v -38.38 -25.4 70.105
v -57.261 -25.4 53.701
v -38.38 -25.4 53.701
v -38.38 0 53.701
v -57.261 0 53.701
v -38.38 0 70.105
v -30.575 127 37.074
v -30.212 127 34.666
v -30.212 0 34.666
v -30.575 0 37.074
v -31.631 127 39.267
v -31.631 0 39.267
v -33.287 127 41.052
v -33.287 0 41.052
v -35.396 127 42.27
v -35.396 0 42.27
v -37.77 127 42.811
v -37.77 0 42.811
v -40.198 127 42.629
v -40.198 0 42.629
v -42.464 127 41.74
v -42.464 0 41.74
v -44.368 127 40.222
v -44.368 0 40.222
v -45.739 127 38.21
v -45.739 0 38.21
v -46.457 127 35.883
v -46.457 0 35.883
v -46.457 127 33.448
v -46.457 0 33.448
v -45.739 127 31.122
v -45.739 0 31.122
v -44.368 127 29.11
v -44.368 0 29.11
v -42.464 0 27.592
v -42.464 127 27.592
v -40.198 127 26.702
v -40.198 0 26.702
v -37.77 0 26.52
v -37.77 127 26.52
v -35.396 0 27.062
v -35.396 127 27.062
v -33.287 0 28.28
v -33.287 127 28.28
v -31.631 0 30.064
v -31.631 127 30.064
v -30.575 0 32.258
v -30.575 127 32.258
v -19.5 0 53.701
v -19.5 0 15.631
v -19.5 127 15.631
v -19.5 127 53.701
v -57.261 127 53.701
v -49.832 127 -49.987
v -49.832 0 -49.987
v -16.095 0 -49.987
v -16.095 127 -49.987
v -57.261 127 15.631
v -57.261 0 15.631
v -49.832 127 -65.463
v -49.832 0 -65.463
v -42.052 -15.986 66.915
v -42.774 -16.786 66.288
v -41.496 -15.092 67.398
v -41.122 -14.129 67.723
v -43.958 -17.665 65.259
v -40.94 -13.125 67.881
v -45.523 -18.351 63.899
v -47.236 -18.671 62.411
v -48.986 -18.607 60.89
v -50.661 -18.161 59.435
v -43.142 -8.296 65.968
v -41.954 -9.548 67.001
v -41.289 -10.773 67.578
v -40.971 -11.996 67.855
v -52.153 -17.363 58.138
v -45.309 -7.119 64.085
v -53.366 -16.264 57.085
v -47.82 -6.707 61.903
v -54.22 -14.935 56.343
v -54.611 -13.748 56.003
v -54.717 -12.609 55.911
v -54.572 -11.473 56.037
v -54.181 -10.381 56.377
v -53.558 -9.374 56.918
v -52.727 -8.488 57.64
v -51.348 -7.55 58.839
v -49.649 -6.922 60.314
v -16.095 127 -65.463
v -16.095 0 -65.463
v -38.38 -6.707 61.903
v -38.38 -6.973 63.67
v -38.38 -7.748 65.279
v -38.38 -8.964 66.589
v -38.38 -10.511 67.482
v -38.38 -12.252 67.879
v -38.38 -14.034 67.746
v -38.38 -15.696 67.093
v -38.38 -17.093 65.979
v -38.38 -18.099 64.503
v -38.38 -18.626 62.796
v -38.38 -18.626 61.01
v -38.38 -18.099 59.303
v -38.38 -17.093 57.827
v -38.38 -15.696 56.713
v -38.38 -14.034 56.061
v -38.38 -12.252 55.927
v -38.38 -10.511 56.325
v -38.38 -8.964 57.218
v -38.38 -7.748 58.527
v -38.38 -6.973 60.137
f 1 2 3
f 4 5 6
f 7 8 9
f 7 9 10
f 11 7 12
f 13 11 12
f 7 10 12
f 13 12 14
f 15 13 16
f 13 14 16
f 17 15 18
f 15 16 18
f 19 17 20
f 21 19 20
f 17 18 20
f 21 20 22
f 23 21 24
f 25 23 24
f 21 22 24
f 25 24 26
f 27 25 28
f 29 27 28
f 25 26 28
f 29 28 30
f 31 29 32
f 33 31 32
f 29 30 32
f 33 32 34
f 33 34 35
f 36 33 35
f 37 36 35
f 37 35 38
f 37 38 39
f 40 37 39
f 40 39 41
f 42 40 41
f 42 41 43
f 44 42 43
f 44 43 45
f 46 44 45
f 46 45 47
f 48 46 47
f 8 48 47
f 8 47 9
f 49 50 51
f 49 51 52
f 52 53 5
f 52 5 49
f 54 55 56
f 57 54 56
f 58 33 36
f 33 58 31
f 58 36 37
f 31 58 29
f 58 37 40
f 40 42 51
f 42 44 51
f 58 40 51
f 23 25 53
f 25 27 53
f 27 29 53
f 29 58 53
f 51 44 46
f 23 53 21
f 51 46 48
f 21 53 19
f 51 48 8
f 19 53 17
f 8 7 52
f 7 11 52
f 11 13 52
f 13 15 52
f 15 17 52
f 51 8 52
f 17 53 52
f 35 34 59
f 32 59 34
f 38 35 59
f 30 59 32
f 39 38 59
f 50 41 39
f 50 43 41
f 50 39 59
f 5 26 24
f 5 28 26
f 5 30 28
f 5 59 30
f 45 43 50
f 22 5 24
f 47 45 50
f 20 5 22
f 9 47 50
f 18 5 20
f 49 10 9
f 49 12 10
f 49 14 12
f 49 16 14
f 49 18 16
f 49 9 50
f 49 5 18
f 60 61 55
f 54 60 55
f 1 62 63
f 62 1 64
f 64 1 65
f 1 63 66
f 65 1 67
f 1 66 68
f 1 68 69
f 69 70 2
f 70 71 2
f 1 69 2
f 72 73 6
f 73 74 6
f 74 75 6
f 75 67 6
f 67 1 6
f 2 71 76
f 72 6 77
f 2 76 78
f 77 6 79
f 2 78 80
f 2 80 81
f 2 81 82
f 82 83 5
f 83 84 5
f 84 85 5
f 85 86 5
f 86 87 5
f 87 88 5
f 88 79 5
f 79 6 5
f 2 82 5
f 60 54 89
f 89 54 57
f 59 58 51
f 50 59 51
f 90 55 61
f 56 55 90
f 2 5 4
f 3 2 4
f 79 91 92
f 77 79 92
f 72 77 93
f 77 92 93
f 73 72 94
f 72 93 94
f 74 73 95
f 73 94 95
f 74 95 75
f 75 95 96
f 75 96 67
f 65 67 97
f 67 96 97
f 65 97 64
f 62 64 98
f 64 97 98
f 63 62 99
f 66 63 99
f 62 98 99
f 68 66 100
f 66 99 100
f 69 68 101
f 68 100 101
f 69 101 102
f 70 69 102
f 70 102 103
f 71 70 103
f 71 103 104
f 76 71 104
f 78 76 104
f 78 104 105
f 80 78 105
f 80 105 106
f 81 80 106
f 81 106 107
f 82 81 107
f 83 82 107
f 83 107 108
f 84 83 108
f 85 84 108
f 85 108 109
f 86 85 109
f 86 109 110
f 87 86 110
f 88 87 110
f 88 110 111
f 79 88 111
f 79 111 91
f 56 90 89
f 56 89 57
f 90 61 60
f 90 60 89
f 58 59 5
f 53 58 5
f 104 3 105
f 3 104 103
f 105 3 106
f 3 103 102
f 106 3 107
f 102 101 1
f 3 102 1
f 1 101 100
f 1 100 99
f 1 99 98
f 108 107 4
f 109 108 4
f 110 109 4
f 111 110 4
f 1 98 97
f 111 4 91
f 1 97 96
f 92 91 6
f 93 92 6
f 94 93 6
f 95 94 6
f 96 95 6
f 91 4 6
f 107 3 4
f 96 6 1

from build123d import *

# Parameters (mm, degrees)
F0_W     = 33.7372906506
F0_H     = 15.4758244753
F1_DEPTH = 127
F0_W_2   = 37.7610065043
F0_H_2   = 38.0705222487
F2_R     = 8.1683633369
F3_DEPTH = 127.001
F5_DEPTH = 25.4
F6_R     = 5.9928653271
F8_DEPTH = 25.4


with BuildPart() as f1:
    # F0 (on Front) → F1 (new body)
    with BuildSketch(Plane.XZ):
        with Locations((-32.9635012895, -57.7248185873)):
            Rectangle(F0_W, F0_H)
    extrude(amount=-F1_DEPTH)


with BuildPart() as f1b:
    # F0 (on Front) → F1, piece 2 (new body)
    with BuildSketch(Plane.XZ):
        with Locations((-38.3800398558, 34.6658416092)):
            Rectangle(F0_W_2, F0_H_2)
    extrude(amount=-F1_DEPTH)

    # F2 (on face) → F3 (cut, through all)
    with BuildSketch(Plane.XZ):
        with Locations((-38.3800398558, 34.6658416092)):
            Circle(F2_R)
    extrude(amount=-F3_DEPTH, mode=Mode.SUBTRACT)


with BuildPart() as f5:
    # F4 (on face) → F5 (new body)
    with BuildSketch(Plane.XZ):
        Polygon((-57.260543108, 53.7011027336), (-38.3800398558, 53.7011027336), (-38.3800398558, 70.1054781675), align=None)
    extrude(amount=F5_DEPTH)

    # F6 (on face) → F8 (cut)
    with BuildSketch(Plane.YZ.offset(-38.3800398558)):
        with Locations((-12.7, 61.9032904506)):
            Circle(F6_R)
    extrude(amount=-F8_DEPTH, mode=Mode.SUBTRACT)


solid = Compound([f1.part, f1b.part, f5.part])
